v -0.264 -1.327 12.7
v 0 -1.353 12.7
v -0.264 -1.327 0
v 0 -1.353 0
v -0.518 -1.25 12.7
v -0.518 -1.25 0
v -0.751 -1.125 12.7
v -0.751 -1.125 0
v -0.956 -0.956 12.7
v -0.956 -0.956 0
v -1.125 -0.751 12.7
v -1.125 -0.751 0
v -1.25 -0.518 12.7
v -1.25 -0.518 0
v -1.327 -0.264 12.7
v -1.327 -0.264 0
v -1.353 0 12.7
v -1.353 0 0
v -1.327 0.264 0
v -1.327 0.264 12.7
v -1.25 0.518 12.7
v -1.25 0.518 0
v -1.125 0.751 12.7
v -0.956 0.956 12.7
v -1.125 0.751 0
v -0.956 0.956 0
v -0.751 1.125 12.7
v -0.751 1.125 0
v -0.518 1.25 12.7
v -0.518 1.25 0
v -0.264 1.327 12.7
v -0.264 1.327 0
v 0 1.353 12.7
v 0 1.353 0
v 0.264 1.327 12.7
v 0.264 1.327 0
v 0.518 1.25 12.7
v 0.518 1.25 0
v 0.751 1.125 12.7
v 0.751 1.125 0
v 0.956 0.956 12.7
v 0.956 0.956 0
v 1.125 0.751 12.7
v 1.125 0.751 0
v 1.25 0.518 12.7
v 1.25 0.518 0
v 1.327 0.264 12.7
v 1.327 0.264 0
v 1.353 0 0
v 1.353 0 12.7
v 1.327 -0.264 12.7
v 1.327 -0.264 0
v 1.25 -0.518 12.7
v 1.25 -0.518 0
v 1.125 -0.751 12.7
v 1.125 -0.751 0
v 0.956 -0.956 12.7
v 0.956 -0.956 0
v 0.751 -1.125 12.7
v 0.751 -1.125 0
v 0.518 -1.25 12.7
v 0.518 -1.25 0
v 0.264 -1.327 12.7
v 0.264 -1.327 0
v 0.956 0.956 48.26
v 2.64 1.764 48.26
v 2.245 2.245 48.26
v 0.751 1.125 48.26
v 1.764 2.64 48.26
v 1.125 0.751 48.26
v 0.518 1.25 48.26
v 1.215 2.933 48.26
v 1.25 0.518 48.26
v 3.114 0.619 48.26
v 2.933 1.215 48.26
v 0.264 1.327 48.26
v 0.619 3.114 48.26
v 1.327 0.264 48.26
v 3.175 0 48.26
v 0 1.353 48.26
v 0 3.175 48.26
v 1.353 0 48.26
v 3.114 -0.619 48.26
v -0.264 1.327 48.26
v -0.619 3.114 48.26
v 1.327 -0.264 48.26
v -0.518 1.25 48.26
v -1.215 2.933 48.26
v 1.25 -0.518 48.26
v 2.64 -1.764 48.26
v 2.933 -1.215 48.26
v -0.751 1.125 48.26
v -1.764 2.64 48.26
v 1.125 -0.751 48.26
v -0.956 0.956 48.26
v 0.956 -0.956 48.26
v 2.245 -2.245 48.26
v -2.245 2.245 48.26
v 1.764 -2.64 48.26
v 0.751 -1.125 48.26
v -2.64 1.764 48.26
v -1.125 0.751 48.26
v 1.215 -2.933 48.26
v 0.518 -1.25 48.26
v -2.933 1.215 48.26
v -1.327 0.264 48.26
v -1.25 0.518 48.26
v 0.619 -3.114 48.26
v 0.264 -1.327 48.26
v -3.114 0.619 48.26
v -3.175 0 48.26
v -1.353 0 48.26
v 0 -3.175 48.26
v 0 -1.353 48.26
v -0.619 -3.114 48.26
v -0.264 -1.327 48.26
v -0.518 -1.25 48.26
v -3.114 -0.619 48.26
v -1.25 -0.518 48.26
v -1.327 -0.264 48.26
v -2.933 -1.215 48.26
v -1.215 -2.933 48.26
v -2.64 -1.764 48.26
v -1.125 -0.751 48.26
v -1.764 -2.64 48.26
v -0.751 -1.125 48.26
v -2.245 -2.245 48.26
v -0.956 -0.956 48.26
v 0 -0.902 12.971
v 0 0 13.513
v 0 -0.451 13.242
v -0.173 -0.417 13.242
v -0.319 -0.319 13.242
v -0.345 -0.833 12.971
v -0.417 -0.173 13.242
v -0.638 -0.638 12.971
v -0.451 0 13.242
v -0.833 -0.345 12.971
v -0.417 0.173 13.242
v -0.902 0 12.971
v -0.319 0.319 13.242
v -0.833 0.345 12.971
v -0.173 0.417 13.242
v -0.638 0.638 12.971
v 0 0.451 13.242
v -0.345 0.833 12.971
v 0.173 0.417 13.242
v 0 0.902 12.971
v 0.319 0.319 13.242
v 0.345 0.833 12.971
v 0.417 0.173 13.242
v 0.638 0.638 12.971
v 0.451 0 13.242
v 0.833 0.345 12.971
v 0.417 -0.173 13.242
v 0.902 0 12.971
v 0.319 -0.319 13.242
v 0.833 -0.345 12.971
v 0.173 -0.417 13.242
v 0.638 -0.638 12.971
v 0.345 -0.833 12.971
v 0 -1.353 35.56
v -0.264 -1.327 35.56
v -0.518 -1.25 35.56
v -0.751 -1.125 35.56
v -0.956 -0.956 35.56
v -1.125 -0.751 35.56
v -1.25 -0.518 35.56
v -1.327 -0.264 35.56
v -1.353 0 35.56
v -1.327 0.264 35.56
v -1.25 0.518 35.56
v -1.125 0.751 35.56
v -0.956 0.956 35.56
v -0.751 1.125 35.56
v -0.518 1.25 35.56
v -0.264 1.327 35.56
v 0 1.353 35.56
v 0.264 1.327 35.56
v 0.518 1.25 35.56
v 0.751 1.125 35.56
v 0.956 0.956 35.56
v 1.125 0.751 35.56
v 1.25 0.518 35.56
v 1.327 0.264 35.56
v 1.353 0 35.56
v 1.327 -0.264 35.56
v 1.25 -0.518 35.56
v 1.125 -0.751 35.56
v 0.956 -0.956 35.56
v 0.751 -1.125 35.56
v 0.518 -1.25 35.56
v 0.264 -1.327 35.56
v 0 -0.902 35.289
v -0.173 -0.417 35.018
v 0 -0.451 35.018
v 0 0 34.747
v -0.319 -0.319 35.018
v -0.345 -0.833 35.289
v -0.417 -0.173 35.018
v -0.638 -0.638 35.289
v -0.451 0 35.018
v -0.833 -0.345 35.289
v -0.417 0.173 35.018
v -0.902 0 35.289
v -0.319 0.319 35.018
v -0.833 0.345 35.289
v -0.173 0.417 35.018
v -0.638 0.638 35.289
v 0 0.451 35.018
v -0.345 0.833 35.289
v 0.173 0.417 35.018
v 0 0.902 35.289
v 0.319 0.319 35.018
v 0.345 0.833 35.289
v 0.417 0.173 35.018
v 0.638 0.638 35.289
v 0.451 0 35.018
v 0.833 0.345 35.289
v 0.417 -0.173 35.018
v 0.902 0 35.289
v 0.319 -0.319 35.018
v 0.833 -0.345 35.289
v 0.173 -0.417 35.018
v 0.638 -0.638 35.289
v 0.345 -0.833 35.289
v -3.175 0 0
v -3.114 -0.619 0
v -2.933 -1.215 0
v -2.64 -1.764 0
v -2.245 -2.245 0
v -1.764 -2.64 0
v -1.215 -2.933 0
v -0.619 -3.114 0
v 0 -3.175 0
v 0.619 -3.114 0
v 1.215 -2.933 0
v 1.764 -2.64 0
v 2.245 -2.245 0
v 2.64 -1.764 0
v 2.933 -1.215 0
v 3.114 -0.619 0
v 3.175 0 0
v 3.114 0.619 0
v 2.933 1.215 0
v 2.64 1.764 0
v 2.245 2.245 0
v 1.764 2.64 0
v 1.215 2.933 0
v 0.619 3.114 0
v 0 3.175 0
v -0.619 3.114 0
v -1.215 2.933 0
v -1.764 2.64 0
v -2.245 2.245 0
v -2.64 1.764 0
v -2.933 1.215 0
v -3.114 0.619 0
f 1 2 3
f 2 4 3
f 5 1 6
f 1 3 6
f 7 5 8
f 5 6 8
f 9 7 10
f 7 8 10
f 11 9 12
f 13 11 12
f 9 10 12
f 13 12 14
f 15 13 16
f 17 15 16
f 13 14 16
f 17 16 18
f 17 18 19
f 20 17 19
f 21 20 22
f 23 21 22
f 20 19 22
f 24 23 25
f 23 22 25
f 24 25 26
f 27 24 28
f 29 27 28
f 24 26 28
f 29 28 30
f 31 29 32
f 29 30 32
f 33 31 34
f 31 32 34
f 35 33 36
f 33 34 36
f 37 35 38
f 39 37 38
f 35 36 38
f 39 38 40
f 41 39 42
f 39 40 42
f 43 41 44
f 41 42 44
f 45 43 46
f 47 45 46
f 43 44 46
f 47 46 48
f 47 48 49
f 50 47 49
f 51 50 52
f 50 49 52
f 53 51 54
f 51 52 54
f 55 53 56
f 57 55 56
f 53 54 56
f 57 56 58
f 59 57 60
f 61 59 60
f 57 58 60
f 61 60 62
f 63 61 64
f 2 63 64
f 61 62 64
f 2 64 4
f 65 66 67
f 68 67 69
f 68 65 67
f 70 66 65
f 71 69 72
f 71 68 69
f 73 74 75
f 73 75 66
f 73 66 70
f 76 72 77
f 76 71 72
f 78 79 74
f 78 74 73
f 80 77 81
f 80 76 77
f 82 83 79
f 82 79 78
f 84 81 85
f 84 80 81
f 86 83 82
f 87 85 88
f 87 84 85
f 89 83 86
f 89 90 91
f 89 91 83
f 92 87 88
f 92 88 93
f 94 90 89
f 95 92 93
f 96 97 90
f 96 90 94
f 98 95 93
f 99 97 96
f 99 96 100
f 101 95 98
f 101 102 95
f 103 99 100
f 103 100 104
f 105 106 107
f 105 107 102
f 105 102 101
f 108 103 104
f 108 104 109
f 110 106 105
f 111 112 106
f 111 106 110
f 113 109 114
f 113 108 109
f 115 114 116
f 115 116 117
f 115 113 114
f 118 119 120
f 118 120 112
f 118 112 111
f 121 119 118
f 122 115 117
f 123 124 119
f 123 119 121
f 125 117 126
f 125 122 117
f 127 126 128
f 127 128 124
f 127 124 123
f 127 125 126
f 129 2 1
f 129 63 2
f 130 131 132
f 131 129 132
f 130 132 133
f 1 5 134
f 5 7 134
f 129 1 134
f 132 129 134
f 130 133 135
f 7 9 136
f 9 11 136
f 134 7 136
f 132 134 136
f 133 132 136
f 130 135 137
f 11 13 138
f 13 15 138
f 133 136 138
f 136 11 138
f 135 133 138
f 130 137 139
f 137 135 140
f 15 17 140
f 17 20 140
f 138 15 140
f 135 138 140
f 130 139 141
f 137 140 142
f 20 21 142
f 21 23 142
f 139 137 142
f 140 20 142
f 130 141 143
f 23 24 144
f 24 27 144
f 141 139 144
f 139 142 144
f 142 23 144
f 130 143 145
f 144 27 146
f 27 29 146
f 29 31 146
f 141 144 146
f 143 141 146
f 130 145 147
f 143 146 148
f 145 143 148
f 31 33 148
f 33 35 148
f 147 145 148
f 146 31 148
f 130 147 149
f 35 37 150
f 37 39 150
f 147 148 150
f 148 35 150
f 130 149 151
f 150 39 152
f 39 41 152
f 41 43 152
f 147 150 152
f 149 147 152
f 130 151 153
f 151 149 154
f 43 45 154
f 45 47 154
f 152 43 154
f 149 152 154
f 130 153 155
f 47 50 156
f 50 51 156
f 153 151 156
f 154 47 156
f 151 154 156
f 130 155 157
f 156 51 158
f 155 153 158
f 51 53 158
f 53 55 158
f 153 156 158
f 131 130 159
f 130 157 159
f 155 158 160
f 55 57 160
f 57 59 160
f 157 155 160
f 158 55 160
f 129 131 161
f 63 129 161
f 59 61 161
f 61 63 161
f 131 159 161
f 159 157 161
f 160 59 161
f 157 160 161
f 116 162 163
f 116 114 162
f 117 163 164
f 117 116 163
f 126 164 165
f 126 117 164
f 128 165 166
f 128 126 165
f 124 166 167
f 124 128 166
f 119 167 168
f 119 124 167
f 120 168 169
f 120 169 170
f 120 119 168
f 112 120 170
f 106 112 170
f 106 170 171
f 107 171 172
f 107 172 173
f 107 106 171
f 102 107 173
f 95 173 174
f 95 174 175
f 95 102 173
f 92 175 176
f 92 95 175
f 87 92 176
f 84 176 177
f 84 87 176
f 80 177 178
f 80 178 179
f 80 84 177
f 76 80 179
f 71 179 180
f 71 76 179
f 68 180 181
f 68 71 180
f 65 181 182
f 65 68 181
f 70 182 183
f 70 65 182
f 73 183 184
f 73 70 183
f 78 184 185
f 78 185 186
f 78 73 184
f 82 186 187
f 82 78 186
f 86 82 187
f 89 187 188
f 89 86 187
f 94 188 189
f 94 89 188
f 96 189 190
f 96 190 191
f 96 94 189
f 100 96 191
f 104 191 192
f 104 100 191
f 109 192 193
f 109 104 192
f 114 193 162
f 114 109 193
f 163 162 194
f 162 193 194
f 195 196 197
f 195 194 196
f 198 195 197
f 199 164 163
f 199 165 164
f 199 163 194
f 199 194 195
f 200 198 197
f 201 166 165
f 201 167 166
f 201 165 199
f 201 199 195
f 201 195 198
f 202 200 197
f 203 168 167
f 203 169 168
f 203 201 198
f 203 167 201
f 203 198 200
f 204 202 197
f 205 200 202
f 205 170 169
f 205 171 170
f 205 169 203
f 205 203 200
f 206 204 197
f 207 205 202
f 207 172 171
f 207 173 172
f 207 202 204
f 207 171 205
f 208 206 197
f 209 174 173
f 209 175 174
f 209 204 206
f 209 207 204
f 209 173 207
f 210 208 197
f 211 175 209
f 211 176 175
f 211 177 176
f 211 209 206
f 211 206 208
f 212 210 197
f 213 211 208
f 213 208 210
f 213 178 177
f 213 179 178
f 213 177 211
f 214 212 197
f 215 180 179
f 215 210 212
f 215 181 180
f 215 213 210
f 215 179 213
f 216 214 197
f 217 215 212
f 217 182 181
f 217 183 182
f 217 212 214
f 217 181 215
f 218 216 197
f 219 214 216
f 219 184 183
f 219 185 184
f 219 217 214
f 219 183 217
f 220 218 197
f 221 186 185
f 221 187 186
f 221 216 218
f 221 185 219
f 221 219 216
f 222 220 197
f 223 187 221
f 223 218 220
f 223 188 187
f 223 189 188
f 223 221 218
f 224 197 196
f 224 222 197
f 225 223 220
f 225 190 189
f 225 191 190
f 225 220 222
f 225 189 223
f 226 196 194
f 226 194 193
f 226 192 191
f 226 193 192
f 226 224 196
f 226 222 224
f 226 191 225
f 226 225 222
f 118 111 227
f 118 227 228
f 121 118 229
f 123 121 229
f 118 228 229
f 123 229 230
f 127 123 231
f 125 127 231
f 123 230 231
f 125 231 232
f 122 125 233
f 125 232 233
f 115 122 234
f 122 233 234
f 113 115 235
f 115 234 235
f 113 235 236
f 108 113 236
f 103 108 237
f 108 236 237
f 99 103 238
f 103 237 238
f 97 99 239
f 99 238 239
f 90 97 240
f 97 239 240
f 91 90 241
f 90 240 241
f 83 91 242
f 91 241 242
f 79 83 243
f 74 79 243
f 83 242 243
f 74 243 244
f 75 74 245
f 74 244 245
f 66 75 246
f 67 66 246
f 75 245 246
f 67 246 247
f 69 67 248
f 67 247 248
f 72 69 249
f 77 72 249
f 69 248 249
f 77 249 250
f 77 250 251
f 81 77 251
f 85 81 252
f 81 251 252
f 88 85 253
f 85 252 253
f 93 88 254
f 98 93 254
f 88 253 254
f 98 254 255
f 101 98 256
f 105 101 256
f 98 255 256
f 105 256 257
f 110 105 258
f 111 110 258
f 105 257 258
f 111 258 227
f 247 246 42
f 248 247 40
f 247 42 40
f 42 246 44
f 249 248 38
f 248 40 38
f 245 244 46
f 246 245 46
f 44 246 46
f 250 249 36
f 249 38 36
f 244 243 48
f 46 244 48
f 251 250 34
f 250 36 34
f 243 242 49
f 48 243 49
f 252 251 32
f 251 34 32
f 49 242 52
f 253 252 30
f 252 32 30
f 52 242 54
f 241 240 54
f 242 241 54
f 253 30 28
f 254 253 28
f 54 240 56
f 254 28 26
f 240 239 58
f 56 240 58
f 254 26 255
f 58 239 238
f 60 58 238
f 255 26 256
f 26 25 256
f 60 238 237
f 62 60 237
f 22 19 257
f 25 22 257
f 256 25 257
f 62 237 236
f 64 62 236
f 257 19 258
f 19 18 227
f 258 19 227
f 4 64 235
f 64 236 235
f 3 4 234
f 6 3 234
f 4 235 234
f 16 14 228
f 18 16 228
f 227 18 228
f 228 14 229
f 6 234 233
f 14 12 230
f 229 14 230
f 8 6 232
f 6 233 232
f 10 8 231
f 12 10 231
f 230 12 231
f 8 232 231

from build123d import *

# Parameters (mm, degrees)
SKETCH1_R           = 3.175
BOSS_EXTRUDE1_DEPTH = 48.26


with BuildPart() as part:
    # Sketch1 → Boss-Extrude1 (new body)
    with BuildSketch(Plane.XY):
        with Locations(Location((0, 0, 0), (0, 0, 180))):
            Circle(SKETCH1_R)
    extrude(amount=BOSS_EXTRUDE1_DEPTH)

    # Sketch4 → #6-32 Tapped Hole1 (revolve, cut)
    with BuildSketch(Plane(origin=(0, 0, 48.26), x_dir=(0, -1, 0), z_dir=(1, 0, 0))):
        Polygon((0, 0), (0, 13.51269403), (1.35255, 12.7), (1.35255, 0), align=None)
    f_6_32_tapped_hole1 = revolve(axis=Axis((0, 0, 54.61), (0, 0, -1)), mode=Mode.SUBTRACT)

    # Mirror1: #6-32 Tapped Hole1 across plane
    add(f_6_32_tapped_hole1.mirror(Plane.XY.offset(24.13)), mode=Mode.SUBTRACT)


solid = part.part
